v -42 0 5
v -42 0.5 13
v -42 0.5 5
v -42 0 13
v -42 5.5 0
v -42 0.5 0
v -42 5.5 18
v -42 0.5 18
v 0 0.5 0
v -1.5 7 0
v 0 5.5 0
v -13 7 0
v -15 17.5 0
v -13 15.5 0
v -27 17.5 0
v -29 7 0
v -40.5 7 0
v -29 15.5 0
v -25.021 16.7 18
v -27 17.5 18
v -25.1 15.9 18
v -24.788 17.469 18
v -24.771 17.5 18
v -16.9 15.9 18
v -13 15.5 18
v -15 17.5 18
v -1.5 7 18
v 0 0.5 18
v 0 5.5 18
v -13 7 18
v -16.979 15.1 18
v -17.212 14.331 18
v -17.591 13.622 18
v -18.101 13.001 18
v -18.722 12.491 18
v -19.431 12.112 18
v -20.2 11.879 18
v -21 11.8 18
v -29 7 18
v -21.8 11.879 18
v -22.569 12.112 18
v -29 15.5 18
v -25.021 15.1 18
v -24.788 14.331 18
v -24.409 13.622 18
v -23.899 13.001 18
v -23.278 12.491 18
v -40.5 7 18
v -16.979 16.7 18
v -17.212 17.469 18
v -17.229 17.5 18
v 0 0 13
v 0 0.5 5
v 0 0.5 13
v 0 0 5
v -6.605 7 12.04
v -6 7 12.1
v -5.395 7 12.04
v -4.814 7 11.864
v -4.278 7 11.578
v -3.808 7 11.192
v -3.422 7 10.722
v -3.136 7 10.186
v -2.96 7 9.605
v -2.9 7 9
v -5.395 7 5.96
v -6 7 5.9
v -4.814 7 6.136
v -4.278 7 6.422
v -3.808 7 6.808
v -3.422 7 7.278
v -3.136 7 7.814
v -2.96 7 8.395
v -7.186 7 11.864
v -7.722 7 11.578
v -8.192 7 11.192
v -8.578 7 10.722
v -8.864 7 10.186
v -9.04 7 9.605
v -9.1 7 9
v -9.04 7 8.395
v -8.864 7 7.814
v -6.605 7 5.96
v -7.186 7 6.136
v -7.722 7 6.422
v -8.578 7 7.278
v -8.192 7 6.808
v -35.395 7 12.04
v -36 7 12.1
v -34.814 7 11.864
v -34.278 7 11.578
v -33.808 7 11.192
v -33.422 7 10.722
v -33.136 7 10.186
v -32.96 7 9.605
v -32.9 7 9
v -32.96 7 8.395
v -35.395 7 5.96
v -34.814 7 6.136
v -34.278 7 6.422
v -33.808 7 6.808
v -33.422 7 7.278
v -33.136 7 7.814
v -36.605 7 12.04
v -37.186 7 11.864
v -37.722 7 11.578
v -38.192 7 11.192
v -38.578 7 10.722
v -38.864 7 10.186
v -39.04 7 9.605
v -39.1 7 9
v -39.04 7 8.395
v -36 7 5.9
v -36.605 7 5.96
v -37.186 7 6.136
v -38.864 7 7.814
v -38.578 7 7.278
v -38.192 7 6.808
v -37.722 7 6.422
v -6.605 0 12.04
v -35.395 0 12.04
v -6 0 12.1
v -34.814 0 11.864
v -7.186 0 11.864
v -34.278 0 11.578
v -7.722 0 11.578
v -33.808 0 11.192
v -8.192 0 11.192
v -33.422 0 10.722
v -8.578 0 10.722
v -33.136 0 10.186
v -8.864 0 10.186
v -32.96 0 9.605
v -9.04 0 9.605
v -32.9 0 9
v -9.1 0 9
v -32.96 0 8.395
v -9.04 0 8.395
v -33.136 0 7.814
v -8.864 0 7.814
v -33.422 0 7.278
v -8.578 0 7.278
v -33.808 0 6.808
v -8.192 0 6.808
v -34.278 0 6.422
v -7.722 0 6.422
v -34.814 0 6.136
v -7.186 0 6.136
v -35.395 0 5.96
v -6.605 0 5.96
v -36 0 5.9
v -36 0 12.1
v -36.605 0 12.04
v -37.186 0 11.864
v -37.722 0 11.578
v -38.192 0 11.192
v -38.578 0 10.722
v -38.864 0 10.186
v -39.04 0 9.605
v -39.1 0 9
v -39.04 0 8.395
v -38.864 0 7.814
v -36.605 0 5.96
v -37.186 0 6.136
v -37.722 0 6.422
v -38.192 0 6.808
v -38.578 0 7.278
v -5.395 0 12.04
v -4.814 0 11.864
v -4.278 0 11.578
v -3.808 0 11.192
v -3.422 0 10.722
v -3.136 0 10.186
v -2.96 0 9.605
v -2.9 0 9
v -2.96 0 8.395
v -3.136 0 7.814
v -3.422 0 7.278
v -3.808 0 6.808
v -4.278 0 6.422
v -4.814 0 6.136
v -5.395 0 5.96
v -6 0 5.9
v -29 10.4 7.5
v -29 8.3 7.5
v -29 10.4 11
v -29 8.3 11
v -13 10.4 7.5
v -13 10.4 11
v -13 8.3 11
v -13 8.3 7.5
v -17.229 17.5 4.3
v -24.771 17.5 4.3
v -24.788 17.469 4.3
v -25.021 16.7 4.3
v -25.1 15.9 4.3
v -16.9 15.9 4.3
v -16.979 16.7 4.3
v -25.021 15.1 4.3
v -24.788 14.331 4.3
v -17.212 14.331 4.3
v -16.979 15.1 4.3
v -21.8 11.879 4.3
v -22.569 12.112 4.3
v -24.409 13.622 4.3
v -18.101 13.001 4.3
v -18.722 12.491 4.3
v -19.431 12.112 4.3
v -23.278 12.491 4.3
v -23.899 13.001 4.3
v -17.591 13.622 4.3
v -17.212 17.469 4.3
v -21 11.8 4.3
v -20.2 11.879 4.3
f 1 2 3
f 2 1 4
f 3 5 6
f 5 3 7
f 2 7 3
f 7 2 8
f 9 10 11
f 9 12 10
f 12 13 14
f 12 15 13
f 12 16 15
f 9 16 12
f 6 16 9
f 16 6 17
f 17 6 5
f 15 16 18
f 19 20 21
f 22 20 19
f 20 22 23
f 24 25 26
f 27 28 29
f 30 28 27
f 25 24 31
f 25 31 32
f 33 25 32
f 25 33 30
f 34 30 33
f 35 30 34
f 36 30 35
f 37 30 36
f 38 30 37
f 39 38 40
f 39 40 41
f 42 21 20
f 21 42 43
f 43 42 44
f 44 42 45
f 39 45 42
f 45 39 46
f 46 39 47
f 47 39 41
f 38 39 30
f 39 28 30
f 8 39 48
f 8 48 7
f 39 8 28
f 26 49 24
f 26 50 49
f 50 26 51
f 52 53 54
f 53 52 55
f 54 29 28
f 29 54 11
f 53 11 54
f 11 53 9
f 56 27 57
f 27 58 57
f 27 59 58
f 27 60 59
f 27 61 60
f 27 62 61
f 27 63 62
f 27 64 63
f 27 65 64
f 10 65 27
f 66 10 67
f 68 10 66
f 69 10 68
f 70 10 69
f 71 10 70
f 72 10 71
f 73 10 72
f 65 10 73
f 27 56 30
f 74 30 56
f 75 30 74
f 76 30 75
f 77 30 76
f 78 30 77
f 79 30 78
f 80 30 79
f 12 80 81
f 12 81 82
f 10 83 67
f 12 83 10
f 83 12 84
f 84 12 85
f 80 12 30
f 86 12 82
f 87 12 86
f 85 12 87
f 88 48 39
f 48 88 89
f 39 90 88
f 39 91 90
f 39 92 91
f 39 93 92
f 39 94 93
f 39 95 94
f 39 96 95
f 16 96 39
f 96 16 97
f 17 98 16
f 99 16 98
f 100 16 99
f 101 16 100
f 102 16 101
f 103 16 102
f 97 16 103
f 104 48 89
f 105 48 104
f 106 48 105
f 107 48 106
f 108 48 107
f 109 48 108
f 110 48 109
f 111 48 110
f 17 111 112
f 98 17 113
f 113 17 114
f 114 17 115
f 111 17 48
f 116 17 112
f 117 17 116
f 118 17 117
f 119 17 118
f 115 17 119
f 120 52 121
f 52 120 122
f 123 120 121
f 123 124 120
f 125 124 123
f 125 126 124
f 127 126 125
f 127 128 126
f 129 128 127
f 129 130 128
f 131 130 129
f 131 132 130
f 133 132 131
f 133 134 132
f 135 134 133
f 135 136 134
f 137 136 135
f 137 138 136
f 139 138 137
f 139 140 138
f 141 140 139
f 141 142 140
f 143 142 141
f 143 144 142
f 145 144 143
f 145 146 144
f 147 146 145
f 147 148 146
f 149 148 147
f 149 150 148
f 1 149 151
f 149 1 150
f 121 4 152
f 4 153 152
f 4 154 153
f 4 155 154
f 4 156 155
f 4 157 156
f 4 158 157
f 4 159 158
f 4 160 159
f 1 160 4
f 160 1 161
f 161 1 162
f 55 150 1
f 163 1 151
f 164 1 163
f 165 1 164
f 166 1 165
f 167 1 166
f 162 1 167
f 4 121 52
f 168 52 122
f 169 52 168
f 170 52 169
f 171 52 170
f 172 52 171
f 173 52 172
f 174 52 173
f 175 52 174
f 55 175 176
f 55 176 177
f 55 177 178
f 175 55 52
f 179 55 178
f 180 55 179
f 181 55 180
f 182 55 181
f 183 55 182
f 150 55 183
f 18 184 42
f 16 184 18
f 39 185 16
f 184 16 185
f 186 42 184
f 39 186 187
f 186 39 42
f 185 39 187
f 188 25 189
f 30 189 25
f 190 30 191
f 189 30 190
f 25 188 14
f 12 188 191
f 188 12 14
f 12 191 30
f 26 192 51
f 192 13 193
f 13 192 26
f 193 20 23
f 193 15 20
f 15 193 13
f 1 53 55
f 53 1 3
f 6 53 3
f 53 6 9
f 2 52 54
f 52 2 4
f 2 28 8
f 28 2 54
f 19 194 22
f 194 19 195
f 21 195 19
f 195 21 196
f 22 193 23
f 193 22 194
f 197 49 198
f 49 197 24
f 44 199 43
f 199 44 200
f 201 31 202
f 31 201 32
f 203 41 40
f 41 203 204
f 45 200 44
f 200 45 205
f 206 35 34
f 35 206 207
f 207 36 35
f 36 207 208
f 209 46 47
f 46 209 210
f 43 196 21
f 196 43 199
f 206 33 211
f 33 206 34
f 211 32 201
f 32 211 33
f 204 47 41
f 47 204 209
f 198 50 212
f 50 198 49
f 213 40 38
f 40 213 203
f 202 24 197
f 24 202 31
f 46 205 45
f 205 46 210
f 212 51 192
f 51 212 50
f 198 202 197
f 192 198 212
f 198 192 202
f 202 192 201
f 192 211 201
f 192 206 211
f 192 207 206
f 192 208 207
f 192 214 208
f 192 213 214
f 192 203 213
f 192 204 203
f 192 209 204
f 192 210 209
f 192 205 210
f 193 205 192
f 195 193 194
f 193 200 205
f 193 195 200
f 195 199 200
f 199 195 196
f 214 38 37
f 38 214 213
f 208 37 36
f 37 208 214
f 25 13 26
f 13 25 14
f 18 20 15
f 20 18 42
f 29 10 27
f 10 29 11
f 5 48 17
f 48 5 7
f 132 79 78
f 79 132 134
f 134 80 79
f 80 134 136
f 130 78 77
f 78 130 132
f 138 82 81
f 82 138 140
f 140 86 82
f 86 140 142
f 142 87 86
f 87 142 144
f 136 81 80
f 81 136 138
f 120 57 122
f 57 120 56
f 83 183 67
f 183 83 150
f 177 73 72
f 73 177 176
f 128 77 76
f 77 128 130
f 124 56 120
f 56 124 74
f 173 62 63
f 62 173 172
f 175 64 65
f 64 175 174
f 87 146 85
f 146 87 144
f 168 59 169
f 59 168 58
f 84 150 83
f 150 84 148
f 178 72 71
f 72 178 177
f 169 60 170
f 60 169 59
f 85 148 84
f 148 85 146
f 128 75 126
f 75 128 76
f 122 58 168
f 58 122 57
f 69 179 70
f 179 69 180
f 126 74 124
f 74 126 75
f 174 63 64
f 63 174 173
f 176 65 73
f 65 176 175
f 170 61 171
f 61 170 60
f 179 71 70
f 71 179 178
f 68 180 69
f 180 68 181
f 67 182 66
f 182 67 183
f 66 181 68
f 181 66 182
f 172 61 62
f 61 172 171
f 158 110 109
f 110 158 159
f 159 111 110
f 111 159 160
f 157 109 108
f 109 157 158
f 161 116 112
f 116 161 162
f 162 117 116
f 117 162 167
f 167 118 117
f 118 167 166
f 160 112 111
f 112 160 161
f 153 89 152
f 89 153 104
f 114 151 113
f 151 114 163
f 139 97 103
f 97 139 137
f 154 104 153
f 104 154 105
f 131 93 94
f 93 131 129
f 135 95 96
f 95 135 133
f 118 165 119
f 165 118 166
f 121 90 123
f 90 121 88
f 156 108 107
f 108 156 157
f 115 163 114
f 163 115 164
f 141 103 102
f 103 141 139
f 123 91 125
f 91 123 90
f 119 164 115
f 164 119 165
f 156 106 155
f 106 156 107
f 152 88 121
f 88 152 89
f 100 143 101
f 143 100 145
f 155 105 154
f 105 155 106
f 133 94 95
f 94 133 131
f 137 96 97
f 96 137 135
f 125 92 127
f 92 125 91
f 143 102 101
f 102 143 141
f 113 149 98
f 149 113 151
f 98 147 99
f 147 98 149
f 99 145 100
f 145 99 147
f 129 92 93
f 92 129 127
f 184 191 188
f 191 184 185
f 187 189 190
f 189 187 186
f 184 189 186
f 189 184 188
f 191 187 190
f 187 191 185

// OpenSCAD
// RebeliX
//
// y rod holder
// GNU GPL v3
// Martin Neruda <neruda@reprap4u.cz>
// http://www.reprap4u.cz

width = 42;
height = 18;
base_thickness = 7;
thickness = 17.5;
rod_diameter = 8;

module y_rod_holder_base(){
  cube([width,base_thickness,height]);
  translate([width/2-8,0,0]) cube([16,thickness,height]);
}

module y_cuts(){
  // Vyrez pro kombistojku
  translate([width+0.1,0.5,(height/2)+4]) rotate([0,0,180]) cube([50,2,10]);
  translate([width+0.1,0.5,0]) rotate([0,0,180]) cube([50,2,(height/2)-4]);
  
  // Vyrez pro 8mm tyc
  translate([width/2,thickness - 1.6,-0.1]) cylinder(h=(height/2)+4.8,r=(rod_diameter/2)+0.1,$fn = 32);
  // Zkosene hrany
  translate([width/2-8,thickness-2,-0.1]) rotate([0,0,45]) cube([10,10,20]);
  translate([width/2+8,thickness-2,-0.1]) rotate([0,0,45]) cube([10,10,20]);
  
  translate([0,base_thickness-1.5,-0.1]) rotate([0,0,45]) cube([10,10,20]);
  translate([width,base_thickness-1.5,-0.1]) rotate([0,0,45]) cube([10,10,20]);
  // Otvory pro M6 srouby
  translate([6,-0.1,height/2]) rotate([-90,0,0]) cylinder(h=10,r=3.1,$fn = 32);
  translate([width-6,-0.1,height/2]) rotate([-90,0,0]) cylinder(h=10,r=3.1,$fn = 32);
  // Otvor pro zip pasku
  translate([5,base_thickness + 1.3,(height/2)-2])  cube([30,2.1,3.5]);
}

translate([0,0,height])rotate([0,-180,0])difference(){
	y_rod_holder_base();
	y_cuts();
}	
